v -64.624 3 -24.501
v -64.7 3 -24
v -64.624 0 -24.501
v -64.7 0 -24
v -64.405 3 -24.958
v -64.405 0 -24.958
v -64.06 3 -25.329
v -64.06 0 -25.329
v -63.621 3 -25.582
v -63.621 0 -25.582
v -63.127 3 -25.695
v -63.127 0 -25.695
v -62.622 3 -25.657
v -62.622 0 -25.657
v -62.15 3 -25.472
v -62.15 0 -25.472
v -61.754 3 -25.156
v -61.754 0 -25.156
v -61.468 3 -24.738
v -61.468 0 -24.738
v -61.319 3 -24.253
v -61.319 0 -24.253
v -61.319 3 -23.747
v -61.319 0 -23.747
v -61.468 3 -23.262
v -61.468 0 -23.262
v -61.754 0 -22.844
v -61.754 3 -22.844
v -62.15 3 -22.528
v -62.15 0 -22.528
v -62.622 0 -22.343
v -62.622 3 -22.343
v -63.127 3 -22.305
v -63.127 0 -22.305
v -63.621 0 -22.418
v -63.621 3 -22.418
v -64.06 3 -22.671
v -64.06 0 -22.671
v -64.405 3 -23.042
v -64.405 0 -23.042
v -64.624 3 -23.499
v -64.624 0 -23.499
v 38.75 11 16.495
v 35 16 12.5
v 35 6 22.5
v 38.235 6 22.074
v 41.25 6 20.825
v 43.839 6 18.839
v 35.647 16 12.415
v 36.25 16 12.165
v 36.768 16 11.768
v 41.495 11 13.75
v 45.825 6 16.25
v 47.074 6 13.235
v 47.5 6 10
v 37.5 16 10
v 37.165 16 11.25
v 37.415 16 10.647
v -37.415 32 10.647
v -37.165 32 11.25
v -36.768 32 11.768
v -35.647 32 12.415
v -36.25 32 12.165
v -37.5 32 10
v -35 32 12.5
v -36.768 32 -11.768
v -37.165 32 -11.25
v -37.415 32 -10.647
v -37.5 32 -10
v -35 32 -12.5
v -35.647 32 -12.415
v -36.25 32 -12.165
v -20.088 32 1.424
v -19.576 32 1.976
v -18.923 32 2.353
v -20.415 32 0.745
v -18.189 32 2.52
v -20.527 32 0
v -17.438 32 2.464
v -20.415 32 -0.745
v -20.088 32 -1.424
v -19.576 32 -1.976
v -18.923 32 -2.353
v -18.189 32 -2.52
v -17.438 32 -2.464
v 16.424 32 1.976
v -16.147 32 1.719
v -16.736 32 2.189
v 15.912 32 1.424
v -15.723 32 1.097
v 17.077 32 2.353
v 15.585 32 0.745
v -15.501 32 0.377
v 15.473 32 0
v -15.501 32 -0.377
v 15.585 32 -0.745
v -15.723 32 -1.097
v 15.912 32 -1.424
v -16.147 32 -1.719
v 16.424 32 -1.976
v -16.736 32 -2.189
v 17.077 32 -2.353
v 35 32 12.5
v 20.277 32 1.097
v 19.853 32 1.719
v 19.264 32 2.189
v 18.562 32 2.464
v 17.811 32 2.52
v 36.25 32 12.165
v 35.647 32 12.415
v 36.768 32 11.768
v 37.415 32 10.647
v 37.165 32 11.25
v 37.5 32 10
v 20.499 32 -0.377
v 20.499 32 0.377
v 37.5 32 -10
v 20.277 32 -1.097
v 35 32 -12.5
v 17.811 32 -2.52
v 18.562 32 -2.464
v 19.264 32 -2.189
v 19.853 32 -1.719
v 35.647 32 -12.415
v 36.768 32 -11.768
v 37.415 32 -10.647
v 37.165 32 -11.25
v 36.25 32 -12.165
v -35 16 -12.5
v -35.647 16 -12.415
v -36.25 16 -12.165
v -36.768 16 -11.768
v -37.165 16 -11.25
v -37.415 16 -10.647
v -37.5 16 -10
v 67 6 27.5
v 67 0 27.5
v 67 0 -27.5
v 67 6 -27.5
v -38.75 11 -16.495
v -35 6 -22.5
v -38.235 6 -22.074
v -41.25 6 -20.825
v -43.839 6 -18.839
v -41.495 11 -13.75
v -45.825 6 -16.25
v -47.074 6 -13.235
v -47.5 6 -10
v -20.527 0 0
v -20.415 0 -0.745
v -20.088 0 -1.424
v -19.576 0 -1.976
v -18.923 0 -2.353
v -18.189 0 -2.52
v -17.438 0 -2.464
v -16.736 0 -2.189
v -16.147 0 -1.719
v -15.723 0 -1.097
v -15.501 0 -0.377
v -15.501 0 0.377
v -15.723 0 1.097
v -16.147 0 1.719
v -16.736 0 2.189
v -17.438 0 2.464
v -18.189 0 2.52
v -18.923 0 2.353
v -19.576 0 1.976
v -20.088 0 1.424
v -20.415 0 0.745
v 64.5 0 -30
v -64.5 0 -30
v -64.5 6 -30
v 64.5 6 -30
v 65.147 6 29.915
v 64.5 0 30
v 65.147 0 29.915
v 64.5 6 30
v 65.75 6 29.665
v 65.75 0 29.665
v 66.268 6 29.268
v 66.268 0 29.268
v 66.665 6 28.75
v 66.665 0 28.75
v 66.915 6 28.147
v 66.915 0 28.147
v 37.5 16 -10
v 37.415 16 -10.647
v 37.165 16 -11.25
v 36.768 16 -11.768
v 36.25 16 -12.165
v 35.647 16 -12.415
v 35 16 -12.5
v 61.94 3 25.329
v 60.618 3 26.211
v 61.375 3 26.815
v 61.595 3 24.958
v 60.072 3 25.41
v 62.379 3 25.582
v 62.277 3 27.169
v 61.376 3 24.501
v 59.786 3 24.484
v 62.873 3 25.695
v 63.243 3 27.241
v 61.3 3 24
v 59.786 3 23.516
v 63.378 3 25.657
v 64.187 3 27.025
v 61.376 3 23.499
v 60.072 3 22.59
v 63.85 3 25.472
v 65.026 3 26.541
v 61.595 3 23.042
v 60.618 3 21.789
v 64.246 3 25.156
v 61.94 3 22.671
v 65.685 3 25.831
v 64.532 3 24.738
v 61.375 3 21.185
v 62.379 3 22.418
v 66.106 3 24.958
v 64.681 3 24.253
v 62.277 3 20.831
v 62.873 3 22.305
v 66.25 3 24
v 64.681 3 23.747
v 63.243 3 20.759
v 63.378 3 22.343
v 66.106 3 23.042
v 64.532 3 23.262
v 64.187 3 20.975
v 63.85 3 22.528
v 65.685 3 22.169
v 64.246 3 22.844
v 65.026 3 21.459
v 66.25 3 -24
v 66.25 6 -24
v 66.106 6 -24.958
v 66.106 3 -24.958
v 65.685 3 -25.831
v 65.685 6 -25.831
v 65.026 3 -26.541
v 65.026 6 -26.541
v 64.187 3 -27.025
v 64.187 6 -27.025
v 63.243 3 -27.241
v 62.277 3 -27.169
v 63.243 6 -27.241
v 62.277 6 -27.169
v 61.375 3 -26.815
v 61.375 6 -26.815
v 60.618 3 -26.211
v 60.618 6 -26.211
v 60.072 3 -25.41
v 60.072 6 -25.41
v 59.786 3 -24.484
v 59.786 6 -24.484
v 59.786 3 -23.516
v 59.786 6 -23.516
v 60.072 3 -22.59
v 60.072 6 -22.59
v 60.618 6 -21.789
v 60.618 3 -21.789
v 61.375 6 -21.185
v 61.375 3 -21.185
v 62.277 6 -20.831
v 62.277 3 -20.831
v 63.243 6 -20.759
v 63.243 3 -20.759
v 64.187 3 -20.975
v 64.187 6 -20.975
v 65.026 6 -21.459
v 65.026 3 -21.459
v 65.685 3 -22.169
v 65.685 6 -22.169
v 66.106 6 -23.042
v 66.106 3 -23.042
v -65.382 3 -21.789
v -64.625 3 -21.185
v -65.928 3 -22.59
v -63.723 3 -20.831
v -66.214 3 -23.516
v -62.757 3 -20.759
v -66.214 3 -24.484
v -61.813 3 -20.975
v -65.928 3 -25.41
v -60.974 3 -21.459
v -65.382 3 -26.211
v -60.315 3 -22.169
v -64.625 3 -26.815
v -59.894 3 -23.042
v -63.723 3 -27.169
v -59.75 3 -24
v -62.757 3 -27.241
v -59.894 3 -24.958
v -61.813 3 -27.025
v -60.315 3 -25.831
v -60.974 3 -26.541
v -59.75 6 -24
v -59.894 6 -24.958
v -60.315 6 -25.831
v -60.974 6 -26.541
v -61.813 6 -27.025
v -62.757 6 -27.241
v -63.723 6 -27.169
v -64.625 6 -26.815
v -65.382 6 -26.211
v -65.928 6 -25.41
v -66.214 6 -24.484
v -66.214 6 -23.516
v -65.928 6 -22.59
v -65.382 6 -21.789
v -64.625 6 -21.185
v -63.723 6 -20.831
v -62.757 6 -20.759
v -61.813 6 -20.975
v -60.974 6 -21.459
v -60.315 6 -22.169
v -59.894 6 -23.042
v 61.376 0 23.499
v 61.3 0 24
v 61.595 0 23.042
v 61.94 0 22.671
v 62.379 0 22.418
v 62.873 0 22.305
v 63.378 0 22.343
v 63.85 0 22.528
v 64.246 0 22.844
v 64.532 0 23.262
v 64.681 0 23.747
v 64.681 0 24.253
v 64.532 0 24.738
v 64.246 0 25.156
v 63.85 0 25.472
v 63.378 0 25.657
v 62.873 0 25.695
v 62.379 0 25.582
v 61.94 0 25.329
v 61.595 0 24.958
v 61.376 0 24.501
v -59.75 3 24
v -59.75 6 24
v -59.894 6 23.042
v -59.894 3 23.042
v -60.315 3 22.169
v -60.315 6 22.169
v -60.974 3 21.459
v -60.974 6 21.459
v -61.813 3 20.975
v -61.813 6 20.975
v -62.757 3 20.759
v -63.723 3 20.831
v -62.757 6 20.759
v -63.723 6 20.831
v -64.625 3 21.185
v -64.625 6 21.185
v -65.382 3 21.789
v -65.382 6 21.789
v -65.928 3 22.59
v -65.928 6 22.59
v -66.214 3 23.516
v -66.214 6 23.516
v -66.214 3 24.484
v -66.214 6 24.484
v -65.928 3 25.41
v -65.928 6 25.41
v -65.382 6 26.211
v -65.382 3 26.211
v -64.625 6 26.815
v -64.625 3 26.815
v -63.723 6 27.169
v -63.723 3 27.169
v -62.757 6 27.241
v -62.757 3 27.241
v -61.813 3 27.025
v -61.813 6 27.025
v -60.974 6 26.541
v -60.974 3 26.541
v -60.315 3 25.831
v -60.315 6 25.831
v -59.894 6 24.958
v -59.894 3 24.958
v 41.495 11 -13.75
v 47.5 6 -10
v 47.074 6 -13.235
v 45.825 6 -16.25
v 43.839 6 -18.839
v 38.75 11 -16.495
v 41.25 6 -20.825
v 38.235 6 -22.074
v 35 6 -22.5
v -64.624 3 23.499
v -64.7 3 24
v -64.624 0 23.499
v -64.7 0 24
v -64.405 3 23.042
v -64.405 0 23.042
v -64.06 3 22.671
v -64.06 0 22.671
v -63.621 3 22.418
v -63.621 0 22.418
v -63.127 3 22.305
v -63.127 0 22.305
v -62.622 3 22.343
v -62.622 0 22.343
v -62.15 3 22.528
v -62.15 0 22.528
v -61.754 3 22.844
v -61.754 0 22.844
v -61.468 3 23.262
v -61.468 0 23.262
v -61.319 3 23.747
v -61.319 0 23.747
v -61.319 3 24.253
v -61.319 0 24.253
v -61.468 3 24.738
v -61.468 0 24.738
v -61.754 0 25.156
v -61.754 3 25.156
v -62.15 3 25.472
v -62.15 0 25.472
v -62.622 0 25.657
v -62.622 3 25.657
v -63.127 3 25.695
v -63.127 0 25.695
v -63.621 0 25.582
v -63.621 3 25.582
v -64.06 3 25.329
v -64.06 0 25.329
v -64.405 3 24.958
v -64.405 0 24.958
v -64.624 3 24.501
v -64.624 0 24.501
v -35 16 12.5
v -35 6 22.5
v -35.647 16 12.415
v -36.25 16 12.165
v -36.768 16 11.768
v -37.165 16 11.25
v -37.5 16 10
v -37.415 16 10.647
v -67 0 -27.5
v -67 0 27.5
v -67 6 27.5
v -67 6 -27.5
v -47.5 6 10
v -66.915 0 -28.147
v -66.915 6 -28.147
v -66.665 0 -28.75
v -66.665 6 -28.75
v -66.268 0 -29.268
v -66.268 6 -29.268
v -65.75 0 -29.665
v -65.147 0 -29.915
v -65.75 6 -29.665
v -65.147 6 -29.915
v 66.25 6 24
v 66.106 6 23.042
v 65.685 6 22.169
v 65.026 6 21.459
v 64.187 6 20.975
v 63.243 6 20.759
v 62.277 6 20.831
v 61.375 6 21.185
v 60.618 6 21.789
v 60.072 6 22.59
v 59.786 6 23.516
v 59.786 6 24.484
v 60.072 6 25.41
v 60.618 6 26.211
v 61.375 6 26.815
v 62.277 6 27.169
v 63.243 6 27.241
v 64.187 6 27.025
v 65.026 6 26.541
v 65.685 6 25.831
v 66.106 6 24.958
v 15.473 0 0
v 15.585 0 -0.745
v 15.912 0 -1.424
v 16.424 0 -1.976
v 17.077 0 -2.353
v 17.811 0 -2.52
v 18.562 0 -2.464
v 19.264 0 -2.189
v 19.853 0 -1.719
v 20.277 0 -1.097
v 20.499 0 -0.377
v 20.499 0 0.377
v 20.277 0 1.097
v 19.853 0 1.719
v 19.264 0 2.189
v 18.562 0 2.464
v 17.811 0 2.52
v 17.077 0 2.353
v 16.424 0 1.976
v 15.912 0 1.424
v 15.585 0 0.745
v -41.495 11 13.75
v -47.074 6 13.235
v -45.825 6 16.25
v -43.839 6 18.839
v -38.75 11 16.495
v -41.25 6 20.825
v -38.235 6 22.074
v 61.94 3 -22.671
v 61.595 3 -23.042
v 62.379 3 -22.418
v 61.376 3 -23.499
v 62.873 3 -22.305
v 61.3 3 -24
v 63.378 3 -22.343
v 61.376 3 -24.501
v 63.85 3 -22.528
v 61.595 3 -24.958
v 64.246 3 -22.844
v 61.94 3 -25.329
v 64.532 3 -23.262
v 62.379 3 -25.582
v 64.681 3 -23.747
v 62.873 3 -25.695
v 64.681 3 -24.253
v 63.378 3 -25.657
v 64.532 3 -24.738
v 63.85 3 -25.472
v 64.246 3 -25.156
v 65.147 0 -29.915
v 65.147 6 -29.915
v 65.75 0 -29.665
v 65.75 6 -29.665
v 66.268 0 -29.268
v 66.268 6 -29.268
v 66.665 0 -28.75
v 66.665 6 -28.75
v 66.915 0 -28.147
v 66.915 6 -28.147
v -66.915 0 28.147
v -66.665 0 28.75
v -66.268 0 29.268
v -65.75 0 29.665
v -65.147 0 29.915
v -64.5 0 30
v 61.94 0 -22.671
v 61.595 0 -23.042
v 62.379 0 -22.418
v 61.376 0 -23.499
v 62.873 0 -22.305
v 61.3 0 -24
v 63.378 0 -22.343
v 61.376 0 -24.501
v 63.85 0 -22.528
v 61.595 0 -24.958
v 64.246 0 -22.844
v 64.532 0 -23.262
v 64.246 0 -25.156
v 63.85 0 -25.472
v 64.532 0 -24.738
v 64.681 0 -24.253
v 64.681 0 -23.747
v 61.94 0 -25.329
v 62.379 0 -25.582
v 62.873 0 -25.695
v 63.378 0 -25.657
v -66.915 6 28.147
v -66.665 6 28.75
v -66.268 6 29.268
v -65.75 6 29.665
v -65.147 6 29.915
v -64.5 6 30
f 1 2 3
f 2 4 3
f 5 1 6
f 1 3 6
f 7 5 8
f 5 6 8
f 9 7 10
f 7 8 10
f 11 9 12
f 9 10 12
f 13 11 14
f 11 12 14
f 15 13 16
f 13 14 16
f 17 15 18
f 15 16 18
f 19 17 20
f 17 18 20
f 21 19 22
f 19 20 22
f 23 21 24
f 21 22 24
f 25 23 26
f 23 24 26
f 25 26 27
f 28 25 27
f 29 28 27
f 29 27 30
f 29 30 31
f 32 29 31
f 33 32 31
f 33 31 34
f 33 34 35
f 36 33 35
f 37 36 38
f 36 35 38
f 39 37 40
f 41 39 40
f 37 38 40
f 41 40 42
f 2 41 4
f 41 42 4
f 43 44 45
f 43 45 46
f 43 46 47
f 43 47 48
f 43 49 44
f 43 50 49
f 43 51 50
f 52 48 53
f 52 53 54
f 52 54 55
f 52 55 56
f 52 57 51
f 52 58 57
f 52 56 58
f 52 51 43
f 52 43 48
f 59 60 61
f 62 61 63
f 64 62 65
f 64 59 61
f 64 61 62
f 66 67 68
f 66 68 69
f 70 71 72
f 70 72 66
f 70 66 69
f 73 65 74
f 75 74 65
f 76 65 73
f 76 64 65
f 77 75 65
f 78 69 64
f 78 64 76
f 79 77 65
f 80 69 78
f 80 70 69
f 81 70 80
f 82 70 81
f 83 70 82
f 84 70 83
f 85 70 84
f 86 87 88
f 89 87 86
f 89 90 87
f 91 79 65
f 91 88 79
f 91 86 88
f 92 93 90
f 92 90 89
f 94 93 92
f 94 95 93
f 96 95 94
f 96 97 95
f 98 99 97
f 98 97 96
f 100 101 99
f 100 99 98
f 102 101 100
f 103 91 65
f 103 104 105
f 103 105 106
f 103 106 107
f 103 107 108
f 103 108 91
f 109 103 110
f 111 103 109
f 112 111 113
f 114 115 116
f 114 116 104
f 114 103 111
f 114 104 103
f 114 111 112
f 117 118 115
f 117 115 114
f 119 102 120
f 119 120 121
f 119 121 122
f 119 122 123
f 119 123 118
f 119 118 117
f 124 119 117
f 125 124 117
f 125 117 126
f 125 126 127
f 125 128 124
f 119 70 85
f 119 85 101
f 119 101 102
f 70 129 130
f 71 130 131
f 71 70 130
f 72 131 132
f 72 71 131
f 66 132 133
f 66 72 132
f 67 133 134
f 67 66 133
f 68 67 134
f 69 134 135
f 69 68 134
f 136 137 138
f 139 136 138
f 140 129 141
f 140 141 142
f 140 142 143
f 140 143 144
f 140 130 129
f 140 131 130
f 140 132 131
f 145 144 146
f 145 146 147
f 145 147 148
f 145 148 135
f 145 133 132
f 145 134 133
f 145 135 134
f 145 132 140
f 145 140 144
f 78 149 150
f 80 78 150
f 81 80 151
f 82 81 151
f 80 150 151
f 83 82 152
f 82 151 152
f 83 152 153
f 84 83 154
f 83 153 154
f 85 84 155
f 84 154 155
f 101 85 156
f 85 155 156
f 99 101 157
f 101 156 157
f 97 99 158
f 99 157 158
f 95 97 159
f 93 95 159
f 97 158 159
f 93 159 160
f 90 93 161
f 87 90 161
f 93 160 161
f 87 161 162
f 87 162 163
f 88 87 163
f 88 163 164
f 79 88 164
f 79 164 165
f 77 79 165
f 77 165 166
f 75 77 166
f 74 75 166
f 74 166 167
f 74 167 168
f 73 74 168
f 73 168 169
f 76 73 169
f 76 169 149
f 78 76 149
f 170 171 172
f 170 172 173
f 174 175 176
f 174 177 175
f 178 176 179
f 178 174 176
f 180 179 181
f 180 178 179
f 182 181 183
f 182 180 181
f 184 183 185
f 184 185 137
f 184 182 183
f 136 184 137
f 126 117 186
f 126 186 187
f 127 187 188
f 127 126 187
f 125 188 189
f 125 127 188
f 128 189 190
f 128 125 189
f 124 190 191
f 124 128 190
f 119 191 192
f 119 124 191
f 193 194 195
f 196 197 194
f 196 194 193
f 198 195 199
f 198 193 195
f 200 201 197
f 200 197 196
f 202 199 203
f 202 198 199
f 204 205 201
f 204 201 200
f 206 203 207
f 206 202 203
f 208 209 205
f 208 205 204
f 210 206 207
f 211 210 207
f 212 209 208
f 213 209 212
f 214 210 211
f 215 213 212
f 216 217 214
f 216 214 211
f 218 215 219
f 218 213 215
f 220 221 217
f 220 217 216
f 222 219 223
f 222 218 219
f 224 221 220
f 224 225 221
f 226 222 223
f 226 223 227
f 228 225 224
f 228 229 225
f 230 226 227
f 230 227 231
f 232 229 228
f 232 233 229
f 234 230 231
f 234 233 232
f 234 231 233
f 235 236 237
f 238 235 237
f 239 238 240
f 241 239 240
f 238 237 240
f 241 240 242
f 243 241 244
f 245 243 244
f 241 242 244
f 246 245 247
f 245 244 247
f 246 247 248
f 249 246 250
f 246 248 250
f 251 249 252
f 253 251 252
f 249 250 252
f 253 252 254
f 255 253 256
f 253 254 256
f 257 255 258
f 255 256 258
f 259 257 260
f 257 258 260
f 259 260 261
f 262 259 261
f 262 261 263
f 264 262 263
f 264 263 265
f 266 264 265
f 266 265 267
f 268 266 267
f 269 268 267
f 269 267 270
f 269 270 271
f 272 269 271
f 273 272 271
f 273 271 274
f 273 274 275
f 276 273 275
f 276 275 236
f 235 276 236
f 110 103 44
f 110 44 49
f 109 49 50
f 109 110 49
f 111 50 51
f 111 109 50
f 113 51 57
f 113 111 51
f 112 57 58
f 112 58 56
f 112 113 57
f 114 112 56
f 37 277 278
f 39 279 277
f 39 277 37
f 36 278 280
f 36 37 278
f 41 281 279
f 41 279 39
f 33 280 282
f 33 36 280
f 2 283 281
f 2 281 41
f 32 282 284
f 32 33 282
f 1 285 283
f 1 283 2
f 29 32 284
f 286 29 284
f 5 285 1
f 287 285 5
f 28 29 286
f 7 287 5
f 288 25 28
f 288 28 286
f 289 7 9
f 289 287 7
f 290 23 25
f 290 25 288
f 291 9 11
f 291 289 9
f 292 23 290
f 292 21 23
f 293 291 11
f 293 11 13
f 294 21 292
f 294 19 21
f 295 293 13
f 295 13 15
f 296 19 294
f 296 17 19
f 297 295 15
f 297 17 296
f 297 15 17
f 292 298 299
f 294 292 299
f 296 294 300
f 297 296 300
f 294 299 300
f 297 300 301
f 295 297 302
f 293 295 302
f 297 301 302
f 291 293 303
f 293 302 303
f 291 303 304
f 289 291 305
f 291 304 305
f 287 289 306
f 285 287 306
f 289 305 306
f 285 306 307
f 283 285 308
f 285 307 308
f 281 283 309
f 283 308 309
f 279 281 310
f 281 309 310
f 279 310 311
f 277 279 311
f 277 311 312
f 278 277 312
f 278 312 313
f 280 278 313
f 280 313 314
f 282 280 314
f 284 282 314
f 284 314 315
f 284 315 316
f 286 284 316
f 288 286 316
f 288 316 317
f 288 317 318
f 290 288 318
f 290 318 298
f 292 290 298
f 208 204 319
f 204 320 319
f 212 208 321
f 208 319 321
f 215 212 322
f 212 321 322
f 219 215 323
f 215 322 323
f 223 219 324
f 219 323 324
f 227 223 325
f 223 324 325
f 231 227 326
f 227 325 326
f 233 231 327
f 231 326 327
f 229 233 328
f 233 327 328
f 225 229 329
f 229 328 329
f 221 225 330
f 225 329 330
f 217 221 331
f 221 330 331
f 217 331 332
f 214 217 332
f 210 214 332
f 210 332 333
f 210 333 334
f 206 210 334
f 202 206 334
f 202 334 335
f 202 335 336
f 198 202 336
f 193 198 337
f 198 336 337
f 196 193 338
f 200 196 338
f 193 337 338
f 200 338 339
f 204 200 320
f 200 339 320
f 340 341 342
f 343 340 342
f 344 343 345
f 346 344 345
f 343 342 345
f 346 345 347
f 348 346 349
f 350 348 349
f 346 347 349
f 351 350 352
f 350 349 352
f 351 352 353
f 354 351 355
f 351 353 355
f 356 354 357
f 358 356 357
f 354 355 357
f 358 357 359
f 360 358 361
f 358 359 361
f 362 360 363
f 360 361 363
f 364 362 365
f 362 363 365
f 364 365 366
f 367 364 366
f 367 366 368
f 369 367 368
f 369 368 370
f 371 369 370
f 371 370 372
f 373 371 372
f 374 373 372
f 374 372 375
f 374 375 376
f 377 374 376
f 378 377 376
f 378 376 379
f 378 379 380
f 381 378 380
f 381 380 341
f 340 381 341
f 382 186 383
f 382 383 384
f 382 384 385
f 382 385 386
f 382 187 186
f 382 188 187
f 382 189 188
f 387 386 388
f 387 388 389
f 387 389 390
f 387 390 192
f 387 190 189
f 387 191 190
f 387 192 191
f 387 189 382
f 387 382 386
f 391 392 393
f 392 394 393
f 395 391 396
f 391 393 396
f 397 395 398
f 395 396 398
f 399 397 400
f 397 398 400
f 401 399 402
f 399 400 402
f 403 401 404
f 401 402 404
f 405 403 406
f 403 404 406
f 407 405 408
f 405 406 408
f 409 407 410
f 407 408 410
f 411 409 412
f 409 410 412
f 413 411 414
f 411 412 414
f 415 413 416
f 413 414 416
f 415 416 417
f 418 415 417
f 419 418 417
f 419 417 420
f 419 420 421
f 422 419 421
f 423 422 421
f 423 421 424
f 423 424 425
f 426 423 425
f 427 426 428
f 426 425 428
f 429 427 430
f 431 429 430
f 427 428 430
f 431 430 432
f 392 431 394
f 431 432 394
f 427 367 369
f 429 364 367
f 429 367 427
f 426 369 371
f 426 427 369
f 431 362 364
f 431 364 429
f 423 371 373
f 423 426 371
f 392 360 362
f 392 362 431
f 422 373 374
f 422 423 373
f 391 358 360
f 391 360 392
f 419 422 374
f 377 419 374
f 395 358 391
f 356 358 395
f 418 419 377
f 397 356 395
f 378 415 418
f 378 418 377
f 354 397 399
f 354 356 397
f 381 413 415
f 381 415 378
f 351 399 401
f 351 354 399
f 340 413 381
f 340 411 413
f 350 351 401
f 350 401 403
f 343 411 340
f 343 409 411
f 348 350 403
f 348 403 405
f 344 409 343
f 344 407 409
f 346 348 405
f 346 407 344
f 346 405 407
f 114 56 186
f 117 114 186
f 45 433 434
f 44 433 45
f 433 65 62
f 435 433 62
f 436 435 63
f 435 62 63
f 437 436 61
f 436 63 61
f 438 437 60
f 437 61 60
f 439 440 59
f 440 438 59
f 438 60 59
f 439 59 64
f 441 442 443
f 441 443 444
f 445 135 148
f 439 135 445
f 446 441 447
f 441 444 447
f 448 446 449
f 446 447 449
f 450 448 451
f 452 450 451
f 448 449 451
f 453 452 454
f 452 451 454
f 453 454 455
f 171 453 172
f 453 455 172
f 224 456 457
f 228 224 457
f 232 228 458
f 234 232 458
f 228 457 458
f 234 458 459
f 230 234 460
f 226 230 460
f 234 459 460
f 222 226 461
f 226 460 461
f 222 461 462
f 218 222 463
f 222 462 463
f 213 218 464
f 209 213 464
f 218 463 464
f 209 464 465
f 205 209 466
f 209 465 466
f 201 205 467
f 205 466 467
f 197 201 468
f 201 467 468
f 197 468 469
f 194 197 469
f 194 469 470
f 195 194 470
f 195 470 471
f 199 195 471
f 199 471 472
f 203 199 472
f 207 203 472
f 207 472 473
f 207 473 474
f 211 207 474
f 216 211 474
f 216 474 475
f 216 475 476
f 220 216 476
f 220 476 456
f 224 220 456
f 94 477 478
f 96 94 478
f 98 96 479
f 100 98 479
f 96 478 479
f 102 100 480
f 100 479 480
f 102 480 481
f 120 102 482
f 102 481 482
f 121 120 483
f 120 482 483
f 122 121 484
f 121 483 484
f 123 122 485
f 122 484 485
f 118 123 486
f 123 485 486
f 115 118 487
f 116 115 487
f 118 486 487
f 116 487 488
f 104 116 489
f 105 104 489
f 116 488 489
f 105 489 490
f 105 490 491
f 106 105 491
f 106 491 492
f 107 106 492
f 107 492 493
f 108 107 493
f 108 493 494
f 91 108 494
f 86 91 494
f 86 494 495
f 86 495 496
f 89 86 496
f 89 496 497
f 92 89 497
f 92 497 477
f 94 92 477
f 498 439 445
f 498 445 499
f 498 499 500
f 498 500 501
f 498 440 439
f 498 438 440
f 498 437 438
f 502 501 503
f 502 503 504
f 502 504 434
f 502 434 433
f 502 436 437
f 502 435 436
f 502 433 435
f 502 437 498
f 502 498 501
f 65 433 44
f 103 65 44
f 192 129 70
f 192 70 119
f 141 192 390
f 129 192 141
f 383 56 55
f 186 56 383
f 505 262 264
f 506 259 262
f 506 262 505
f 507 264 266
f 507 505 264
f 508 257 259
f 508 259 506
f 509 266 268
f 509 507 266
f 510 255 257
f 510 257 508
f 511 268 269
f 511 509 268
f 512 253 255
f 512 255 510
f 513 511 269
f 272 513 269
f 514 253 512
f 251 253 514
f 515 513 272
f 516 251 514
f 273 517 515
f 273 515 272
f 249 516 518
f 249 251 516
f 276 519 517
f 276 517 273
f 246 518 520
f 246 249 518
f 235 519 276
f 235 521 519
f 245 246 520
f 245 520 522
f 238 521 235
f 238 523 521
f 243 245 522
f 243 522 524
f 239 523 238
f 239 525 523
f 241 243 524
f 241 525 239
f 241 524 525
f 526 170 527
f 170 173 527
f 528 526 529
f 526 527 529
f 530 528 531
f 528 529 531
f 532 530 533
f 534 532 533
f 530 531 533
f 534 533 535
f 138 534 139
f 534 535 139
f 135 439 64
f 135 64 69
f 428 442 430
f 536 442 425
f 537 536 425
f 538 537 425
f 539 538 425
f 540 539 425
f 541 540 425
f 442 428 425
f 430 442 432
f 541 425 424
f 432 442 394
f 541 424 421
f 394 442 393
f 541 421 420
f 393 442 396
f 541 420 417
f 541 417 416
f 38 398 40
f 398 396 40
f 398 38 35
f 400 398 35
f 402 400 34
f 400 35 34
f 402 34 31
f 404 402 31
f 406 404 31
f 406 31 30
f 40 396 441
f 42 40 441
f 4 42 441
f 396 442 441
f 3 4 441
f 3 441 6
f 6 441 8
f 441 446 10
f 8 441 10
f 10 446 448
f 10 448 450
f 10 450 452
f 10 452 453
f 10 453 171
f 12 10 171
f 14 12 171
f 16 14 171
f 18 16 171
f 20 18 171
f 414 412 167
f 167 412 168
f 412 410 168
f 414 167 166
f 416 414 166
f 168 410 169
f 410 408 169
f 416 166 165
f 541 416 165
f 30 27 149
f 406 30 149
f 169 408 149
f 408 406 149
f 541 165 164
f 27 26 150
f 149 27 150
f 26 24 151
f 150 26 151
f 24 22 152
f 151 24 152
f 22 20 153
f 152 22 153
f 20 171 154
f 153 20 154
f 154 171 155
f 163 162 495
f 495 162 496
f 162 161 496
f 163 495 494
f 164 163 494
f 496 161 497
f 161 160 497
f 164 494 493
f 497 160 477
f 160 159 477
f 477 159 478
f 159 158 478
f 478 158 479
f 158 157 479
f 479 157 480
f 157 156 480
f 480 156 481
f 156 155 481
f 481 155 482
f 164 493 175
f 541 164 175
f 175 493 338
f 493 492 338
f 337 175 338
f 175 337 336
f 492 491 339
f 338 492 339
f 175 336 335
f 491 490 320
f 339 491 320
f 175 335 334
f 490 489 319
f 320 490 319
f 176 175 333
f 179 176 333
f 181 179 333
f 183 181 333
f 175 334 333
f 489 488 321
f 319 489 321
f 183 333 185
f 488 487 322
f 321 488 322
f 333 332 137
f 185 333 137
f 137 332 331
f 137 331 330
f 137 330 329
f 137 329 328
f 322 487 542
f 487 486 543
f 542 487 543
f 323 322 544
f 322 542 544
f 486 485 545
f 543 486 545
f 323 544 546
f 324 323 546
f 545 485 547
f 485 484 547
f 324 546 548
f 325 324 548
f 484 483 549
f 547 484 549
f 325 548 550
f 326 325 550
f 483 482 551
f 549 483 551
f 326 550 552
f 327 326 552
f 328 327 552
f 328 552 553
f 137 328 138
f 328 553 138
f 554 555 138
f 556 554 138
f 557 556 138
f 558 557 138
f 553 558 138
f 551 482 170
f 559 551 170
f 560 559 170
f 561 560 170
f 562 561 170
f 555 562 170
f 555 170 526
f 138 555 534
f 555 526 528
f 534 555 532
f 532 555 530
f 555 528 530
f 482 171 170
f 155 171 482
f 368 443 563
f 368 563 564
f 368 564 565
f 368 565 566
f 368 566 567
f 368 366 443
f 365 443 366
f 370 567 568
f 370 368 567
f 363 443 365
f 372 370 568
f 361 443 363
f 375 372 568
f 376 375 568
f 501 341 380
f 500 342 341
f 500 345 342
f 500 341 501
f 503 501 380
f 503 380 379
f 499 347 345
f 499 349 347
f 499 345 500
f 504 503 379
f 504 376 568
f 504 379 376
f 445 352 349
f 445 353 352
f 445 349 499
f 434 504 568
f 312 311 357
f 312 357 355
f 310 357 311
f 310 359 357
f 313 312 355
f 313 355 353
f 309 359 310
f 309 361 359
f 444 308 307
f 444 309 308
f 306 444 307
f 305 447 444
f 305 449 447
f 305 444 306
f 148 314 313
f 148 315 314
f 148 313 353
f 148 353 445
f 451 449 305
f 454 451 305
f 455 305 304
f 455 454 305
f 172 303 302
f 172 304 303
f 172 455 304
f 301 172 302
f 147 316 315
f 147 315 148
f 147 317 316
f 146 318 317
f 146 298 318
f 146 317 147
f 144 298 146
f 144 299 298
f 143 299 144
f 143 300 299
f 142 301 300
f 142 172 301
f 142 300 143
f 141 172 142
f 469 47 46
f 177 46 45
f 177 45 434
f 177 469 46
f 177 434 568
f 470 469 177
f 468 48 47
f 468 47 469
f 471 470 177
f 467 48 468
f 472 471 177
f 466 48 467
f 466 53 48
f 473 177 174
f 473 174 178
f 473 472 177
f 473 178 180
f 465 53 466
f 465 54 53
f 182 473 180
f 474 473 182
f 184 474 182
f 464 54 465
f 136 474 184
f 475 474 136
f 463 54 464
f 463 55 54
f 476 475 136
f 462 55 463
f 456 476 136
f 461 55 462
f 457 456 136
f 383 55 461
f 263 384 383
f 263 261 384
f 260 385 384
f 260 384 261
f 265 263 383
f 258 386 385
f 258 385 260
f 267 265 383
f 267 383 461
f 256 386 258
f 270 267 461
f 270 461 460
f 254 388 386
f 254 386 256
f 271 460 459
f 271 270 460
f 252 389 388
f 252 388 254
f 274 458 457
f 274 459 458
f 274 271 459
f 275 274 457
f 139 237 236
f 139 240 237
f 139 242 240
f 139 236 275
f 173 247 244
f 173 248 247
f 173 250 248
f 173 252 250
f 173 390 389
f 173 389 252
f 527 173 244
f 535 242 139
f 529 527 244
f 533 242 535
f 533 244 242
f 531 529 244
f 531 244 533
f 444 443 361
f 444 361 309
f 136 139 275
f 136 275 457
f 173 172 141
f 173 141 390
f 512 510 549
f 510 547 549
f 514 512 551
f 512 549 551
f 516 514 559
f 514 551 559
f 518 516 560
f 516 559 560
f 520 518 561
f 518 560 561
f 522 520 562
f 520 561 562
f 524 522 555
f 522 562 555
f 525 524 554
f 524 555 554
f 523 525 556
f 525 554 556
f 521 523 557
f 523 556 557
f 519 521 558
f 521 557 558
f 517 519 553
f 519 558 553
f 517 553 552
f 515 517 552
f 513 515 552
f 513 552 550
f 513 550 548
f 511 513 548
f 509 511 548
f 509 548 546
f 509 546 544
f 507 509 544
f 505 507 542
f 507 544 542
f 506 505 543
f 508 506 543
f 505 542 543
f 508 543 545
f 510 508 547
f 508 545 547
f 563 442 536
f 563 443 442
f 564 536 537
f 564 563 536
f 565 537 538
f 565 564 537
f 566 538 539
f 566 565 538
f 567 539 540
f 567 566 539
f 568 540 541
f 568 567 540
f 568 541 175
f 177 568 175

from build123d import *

# Parameters (mm, degrees)
SKETCH1_W                      = 134
SKETCH1_H                      = 60
BOSS_EXTRUDE1_DEPTH            = 6
CBORE_FOR_M3_SHCS1_D           = 3.4
CBORE_FOR_M3_SHCS1_DEPTH       = 17.38
CBORE_FOR_M3_SHCS1_CBORE_D     = 6.5
CBORE_FOR_M3_SHCS1_CBORE_DEPTH = 3
CBORE_FOR_M3_SHCS1_TIP         = 1.021463052
SKETCH4_W                      = 75
SKETCH4_H                      = 25
BOSS_EXTRUDE2_DEPTH            = 26
F_8_0_199_DIAMETER_HOLE1_D     = 5.0546
FILLET1_R                      = 2.5
FILLET2_R                      = 2.5
CHAMFER1_SIZE                  = 10


with BuildPart() as part:
    # Sketch1 → Boss-Extrude1 (new body)
    with BuildSketch(Plane(origin=(0, 0, 0), x_dir=(1, 0, 0), z_dir=(0, 1, 0))):
        Rectangle(SKETCH1_W, SKETCH1_H)
    extrude(amount=BOSS_EXTRUDE1_DEPTH)

    # CBORE for M3 SHCS1
    with Locations(Plane(origin=(0, 6, 0), x_dir=(1, 0, 0), z_dir=(0, 1, 0))):
        with Locations((-63, 24), (-63, -24), (63, -24), (63, 24)):
            CounterBoreHole(CBORE_FOR_M3_SHCS1_D / 2, CBORE_FOR_M3_SHCS1_CBORE_D / 2, CBORE_FOR_M3_SHCS1_CBORE_DEPTH, depth=CBORE_FOR_M3_SHCS1_DEPTH)
            with Locations((0, 0, -(CBORE_FOR_M3_SHCS1_DEPTH + CBORE_FOR_M3_SHCS1_TIP / 2))):  # 118° drill point
                Cone(0, CBORE_FOR_M3_SHCS1_D / 2, CBORE_FOR_M3_SHCS1_TIP, mode=Mode.SUBTRACT)

    # Sketch4 → Boss-Extrude2 (add)
    with BuildSketch(Plane(origin=(0, 6, 0), x_dir=(1, 0, 0), z_dir=(0, 1, 0))):
        Rectangle(SKETCH4_W, SKETCH4_H)
    extrude(amount=BOSS_EXTRUDE2_DEPTH)

    # #8 (0.199) Diameter Hole1 (through all)
    with Locations(Plane(origin=(0, 32, 0), x_dir=(1, 0, 0), z_dir=(0, 1, 0))):
        with Locations((-18, 0), (18, 0)):
            Hole(F_8_0_199_DIAMETER_HOLE1_D / 2)

    # Fillet1
    fillet1_edges = [part.edges().sort_by_distance(p)[0] for p in [
        (67, 3, 30),
        (-67, 3, 30),
        (-67, 3, -30),
        (67, 3, -30),
    ]]
    fillet(fillet1_edges, radius=FILLET1_R)

    # Fillet2
    fillet2_edges = [part.edges().sort_by_distance(p)[0] for p in [
        (37.5, 19, 12.5),
        (37.5, 19, -12.5),
        (-37.5, 19, -12.5),
        (-37.5, 19, 12.5),
    ]]
    fillet(fillet2_edges, radius=FILLET2_R)

    # Chamfer1
    chamfer1_edges = [part.edges().sort_by_distance(p)[0] for p in [
        (37.5, 6, 0),
        (0, 6, 12.5),
        (-37.5, 6, 0),
        (36.767766953, 6, -11.767766953),
        (36.767766953, 6, 11.767766953),
        (-36.767766953, 6, 11.767766953),
        (-36.767766953, 6, -11.767766953),
        (0, 6, -12.5),
    ]]
    chamfer(chamfer1_edges, length=CHAMFER1_SIZE)


solid = part.part
